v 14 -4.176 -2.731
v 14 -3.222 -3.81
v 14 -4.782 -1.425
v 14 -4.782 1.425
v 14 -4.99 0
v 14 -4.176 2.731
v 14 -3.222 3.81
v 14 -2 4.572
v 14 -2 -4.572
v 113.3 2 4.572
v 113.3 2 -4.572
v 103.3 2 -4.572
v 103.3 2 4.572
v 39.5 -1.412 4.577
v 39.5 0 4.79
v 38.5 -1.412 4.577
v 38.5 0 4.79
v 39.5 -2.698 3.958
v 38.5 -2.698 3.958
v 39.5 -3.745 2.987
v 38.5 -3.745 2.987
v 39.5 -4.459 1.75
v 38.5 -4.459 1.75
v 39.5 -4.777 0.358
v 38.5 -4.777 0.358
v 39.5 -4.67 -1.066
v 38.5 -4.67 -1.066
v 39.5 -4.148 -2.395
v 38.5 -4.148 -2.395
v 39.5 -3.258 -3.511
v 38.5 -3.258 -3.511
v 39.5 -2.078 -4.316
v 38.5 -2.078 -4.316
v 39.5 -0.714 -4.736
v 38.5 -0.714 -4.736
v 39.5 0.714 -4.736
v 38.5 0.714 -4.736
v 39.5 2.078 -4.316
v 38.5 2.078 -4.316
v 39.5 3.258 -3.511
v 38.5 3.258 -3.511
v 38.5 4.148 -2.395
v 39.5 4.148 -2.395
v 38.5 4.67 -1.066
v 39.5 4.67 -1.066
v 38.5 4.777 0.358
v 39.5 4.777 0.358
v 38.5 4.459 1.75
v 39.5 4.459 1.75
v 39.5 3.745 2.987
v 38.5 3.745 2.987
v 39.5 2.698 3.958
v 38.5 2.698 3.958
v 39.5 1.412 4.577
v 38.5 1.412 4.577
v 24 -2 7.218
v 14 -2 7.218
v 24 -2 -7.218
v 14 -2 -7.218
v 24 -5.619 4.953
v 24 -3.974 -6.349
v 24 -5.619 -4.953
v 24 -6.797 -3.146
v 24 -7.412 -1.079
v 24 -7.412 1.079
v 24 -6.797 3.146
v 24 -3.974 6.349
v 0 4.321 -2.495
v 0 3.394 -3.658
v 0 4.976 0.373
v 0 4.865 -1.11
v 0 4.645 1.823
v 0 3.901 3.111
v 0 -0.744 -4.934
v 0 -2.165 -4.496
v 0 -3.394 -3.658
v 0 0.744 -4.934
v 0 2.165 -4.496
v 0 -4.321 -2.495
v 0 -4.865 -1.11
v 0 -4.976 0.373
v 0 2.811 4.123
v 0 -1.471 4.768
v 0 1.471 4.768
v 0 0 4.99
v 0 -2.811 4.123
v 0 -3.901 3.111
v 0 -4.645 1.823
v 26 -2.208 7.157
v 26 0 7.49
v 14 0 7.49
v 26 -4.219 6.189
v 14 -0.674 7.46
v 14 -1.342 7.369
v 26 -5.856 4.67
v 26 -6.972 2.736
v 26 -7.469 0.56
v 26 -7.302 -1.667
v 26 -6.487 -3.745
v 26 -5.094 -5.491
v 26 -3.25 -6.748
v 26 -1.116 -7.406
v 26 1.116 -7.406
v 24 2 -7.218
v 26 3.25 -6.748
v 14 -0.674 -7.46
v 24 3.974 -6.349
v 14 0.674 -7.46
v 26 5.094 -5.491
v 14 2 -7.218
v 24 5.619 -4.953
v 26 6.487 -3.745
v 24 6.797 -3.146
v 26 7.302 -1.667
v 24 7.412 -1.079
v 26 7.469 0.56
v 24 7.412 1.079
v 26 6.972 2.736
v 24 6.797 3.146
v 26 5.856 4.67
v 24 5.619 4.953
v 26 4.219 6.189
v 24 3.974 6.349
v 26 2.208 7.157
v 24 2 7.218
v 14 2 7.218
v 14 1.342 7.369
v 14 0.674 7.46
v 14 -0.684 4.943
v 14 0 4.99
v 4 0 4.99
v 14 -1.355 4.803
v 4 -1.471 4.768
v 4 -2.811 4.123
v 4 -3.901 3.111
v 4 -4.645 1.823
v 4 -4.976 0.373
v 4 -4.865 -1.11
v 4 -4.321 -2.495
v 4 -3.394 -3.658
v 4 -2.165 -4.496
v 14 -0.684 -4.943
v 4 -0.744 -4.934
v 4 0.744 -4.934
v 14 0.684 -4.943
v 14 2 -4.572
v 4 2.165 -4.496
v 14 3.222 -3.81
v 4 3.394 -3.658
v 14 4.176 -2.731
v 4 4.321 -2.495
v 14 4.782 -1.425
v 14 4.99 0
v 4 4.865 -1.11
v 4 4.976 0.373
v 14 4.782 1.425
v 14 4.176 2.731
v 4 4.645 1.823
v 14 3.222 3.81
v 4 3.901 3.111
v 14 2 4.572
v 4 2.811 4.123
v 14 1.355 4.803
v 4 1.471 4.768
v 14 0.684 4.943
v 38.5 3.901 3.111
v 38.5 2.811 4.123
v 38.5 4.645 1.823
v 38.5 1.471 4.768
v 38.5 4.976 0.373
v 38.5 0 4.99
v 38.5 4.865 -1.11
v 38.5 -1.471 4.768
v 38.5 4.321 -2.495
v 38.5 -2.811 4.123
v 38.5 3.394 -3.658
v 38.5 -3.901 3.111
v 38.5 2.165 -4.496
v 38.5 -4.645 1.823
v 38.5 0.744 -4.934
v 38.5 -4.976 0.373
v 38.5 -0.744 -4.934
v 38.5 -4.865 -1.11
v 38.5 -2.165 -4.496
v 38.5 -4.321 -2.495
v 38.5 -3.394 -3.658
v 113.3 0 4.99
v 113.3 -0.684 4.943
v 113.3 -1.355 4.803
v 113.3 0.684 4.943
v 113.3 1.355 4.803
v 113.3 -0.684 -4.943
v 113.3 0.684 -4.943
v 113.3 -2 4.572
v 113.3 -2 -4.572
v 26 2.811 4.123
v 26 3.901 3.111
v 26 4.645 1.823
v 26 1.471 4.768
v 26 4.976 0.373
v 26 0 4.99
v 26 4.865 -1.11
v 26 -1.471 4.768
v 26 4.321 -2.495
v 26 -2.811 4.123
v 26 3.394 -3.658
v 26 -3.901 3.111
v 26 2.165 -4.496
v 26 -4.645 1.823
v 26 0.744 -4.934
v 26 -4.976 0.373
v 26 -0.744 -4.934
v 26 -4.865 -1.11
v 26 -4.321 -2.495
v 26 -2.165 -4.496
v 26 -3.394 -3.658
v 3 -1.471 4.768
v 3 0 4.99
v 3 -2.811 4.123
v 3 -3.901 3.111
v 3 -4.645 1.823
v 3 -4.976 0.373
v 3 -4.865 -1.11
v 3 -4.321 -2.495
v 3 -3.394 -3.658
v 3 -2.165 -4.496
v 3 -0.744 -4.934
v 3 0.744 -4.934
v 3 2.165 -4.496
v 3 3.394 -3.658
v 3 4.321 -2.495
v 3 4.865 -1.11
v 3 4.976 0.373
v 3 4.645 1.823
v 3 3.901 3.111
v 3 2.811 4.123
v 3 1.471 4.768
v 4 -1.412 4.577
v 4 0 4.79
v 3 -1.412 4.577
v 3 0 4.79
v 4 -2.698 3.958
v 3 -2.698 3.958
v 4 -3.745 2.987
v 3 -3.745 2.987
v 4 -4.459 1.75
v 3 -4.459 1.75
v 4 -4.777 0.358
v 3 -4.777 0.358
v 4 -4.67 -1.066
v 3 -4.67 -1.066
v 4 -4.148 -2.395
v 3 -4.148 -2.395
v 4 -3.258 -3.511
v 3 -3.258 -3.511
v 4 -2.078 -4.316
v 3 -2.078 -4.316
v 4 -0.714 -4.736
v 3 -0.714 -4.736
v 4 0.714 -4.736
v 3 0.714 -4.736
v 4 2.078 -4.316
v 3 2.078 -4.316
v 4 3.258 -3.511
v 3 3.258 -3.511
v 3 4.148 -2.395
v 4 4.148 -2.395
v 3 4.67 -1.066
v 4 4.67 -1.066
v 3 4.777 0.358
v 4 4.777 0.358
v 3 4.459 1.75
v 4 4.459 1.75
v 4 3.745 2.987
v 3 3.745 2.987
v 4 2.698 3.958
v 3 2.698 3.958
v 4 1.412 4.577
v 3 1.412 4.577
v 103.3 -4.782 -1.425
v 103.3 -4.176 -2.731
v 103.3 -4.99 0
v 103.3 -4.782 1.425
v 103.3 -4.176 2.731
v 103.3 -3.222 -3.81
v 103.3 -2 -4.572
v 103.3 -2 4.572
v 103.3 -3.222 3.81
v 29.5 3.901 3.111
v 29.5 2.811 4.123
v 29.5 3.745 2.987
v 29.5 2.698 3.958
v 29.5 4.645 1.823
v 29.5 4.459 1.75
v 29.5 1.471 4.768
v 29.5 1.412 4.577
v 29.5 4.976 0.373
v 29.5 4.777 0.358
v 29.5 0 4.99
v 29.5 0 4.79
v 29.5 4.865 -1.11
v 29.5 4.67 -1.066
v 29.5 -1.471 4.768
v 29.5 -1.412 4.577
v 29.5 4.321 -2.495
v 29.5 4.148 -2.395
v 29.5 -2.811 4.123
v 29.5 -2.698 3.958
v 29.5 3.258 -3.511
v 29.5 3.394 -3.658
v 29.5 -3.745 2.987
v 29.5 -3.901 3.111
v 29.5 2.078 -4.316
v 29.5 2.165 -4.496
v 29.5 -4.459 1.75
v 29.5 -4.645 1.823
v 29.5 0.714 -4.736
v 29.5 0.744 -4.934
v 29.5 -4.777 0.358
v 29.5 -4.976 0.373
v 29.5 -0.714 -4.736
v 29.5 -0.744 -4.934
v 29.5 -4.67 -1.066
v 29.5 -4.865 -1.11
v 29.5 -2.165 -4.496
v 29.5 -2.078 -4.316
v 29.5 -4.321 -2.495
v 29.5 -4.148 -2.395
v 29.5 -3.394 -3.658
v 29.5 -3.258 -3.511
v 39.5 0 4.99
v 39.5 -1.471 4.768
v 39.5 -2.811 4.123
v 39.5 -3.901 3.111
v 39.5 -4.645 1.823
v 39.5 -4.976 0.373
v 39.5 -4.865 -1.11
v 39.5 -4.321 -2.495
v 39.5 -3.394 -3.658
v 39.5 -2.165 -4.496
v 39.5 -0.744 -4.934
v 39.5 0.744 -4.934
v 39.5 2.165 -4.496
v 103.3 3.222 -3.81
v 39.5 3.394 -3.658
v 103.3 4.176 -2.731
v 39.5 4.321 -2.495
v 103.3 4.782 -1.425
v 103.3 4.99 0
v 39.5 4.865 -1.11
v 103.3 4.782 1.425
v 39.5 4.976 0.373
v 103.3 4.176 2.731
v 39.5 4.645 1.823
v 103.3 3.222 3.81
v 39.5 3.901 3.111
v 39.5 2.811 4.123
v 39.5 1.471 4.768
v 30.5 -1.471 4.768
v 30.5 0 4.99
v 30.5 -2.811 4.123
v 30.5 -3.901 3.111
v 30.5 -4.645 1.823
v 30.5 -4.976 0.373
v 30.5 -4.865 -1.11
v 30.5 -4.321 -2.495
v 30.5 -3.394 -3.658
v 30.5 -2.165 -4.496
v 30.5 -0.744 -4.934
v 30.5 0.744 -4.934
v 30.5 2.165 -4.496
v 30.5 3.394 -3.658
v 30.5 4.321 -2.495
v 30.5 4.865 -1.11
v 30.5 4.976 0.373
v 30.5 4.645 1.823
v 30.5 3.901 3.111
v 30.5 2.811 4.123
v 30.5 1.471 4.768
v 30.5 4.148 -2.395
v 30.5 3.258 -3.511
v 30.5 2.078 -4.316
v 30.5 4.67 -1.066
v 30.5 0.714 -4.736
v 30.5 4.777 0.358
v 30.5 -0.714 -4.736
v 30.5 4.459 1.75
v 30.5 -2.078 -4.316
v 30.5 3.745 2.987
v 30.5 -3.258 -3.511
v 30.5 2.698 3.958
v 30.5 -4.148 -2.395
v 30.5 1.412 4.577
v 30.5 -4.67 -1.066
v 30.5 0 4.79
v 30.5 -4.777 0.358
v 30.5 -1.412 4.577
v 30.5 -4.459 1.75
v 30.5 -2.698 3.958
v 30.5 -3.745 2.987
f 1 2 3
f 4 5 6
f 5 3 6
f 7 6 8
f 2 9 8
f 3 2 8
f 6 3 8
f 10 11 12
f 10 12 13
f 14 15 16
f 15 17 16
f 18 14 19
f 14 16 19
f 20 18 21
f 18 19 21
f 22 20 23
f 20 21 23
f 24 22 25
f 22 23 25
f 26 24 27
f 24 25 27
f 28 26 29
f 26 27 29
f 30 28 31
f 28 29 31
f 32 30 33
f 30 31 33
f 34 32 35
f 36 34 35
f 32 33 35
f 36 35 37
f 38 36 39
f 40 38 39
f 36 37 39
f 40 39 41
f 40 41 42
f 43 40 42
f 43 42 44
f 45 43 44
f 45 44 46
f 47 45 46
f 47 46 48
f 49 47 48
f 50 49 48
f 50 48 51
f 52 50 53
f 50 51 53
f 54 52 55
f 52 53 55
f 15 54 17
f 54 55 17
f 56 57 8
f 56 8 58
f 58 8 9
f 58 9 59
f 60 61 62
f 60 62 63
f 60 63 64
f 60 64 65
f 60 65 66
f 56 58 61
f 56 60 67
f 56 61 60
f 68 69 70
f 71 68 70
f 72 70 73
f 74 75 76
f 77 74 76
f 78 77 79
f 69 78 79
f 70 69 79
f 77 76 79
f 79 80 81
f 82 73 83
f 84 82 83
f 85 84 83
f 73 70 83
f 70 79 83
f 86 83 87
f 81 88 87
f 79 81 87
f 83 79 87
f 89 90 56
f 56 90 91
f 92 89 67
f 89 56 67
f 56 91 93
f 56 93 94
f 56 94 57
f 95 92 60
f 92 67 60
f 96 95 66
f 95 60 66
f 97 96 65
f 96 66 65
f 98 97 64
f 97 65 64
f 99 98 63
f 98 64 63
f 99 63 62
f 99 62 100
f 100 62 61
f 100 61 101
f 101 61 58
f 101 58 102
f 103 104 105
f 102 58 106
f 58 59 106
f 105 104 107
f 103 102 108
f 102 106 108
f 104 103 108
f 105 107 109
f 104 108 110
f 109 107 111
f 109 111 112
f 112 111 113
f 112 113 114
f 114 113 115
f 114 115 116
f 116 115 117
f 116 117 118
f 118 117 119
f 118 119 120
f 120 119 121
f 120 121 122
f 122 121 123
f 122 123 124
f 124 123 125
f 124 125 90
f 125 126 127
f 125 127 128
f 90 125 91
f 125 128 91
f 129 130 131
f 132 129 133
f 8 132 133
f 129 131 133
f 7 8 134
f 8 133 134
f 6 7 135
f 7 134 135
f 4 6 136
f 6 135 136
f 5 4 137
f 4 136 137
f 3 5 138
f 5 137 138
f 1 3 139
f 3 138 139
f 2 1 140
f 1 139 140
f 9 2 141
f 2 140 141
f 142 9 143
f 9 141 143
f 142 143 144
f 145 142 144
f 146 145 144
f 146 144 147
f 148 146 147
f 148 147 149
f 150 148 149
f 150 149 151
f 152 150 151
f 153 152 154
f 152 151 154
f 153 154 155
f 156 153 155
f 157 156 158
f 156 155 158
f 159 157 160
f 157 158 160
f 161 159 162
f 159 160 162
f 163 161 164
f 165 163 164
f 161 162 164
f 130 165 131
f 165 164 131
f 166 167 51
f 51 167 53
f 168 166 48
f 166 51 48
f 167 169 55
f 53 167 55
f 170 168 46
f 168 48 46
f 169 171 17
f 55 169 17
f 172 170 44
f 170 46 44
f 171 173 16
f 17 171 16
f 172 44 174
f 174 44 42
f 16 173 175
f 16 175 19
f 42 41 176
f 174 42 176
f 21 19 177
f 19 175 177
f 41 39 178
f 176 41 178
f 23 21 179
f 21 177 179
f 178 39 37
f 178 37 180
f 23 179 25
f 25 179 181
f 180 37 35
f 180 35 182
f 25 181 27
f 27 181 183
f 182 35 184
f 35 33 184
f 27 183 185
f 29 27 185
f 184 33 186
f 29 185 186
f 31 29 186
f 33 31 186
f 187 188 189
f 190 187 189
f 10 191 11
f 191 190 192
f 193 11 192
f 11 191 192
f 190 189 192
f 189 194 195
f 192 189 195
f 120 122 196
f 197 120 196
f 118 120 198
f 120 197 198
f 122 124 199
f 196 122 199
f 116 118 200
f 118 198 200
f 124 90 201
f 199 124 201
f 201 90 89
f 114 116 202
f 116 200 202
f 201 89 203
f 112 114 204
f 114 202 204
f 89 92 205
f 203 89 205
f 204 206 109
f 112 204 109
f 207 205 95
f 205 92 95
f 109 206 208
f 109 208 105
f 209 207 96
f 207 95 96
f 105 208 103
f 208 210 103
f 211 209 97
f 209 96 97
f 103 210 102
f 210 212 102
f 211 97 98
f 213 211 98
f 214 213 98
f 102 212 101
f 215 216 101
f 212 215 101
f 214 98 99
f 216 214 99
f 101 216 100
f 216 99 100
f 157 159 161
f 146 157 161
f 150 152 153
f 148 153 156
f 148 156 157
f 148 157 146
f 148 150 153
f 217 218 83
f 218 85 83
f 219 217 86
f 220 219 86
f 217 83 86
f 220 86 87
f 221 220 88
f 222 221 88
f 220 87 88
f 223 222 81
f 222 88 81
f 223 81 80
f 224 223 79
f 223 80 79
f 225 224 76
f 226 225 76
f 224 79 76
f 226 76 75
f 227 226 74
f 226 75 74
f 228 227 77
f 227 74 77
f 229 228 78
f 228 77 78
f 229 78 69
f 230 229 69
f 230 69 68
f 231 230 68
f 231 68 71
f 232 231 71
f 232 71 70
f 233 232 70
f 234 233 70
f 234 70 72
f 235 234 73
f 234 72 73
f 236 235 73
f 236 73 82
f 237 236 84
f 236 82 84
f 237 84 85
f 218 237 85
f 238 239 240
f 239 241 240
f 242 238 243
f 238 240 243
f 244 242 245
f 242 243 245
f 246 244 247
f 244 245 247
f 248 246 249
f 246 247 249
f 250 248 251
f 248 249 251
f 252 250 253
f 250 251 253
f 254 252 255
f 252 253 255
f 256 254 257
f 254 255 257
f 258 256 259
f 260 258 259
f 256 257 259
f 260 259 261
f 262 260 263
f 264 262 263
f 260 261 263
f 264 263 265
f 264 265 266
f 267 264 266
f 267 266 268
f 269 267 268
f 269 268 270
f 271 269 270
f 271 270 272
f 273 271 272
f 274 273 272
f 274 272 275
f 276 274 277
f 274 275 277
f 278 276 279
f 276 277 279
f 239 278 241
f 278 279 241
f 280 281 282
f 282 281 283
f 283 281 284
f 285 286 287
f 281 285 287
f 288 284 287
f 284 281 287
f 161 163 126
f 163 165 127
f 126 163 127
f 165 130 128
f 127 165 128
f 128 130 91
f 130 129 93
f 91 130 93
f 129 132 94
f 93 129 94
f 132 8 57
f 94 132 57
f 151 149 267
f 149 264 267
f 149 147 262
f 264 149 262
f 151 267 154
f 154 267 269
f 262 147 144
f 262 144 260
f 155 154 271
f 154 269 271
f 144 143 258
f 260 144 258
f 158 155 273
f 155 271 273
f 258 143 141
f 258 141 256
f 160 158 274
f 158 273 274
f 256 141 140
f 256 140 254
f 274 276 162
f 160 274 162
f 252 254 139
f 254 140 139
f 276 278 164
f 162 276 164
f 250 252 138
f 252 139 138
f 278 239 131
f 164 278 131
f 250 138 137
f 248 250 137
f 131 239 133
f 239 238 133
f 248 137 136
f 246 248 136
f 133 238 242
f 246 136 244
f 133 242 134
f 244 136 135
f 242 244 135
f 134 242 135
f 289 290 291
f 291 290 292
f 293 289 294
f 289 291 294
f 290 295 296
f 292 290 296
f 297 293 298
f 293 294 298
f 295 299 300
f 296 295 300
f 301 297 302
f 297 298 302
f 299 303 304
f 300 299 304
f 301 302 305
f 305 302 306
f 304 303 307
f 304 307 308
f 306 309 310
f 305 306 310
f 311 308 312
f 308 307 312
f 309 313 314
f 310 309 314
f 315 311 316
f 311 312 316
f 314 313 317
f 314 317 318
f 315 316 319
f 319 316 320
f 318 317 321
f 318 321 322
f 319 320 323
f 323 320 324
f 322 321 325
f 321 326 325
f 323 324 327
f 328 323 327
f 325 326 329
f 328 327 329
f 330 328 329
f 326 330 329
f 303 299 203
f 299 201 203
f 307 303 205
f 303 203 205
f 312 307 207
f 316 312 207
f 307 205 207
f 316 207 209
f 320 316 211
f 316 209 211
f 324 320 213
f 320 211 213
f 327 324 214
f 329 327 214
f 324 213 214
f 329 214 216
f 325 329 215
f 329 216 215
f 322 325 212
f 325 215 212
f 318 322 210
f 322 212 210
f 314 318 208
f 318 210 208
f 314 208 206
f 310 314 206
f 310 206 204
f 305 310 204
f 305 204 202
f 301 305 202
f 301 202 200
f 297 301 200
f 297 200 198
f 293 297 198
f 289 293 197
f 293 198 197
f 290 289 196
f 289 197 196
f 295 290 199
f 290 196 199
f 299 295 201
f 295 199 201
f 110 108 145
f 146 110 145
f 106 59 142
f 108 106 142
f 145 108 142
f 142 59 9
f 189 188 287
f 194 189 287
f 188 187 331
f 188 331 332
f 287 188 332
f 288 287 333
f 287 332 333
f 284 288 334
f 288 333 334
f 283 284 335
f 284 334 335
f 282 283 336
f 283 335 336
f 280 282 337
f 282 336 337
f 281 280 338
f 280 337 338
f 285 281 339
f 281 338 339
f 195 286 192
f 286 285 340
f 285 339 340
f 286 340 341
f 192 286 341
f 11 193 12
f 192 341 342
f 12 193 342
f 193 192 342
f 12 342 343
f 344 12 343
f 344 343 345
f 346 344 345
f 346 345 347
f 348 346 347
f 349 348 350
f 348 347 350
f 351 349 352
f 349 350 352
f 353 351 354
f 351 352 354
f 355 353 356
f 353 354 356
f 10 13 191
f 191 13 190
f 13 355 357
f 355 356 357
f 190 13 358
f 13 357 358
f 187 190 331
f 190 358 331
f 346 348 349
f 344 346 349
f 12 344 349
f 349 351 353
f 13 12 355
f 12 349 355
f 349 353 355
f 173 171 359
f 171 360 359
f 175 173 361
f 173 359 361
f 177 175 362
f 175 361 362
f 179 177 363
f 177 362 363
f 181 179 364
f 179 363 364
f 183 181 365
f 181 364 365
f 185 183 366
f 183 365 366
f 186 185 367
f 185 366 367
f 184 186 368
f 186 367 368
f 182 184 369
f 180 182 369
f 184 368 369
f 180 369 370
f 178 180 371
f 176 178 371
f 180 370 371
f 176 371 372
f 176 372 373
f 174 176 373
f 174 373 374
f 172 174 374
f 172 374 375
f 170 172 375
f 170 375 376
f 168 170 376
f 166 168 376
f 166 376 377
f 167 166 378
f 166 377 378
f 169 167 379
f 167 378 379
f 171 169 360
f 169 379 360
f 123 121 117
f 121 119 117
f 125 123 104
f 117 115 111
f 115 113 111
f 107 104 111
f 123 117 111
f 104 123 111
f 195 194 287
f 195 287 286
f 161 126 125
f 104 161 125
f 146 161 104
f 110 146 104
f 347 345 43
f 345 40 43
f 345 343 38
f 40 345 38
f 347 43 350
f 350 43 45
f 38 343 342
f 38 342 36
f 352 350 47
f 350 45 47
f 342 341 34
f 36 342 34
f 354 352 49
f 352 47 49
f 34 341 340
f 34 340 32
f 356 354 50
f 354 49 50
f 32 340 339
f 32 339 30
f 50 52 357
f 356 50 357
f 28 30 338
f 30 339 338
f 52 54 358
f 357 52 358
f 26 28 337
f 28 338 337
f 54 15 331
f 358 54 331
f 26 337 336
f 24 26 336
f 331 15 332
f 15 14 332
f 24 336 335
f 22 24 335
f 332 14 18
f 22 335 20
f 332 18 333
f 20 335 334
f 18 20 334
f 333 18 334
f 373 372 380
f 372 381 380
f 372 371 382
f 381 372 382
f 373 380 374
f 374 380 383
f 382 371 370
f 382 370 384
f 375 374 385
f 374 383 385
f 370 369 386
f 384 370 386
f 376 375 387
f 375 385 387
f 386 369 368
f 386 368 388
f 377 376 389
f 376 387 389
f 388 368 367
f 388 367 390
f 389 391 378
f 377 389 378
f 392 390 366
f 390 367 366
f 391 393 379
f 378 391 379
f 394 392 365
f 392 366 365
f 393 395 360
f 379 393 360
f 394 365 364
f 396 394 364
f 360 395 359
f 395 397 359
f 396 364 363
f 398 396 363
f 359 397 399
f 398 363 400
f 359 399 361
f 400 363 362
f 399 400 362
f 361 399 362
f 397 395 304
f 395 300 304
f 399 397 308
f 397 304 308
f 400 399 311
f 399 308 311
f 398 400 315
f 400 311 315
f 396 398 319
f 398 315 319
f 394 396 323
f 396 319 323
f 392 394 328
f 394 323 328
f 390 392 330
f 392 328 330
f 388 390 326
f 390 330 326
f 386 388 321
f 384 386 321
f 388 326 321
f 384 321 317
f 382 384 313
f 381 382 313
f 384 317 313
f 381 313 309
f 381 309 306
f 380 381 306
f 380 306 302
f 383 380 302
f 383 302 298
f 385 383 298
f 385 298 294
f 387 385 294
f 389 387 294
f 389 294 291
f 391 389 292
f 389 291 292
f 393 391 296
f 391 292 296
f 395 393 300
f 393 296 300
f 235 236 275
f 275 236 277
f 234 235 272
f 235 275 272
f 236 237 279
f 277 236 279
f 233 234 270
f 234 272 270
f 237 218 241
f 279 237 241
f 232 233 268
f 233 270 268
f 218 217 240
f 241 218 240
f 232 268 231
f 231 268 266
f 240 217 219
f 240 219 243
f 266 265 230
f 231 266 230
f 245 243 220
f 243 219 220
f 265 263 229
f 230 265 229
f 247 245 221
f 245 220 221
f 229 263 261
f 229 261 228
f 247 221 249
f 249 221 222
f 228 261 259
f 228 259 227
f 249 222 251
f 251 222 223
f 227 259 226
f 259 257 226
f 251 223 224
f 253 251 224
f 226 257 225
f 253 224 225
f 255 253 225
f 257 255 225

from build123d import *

# Parameters (mm, degrees)
CUT_EXTRUDE8_DEPTH = 10
CUT_EXTRUDE9_DEPTH = 10


with BuildPart() as part:
    # Sketch3 → Revolve1 (revolve)
    with BuildSketch(Plane(origin=(0, 0, 0), x_dir=(1, 0, 0), z_dir=(0, 1, 0)), mode=Mode.PRIVATE) as revolve1_sk:
        Polygon((0, 0), (113.3, 0), (113.3, 4.99), (39.5, 4.99), (39.5, 4.79), (38.5, 4.79), (38.5, 4.99), (30.5, 4.99), (30.5, 4.79), (29.5, 4.79), (29.5, 4.99), (26, 4.99), (26, 7.49), (14, 7.49), (14, 4.99), (4, 4.99), (4, 4.79), (3, 4.79), (3, 4.99), (0, 4.99), align=None)
    revolve(revolve1_sk.sketch.rotate(Axis((0, 0, 0), (1, 0, 0)), 180), axis=Axis((0, 0, 0), (1, 0, 0)))

    # Sketch10 → Cut-Extrude8 (cut)
    with BuildSketch(Plane.ZY.offset(-14)):
        with BuildLine():
            Line((7.228416147, 2), (-7.228416147, 2))
            ThreePointArc((-7.228416147, 2), (0, 7.5), (7.228416147, 2))
        make_face()
        with BuildLine():
            Line((7.228416147, -2), (-7.228416147, -2))
            ThreePointArc((-7.228416147, -2), (0, -7.5), (7.228416147, -2))
        make_face()
    extrude(amount=-CUT_EXTRUDE8_DEPTH, mode=Mode.SUBTRACT)

    # Sketch11 → Cut-Extrude9 (cut)
    with BuildSketch(Plane(origin=(113.3, 0, 0), x_dir=(0, 0, -1), z_dir=(1, 0, 0))):
        with BuildLine():
            Line((-4.582575695, -2), (4.582575695, -2))
            ThreePointArc((4.582575695, -2), (0, -5), (-4.582575695, -2))
        make_face()
        with BuildLine():
            Line((4.582575695, 2), (-4.582575695, 2))
            ThreePointArc((-4.582575695, 2), (0, 5), (4.582575695, 2))
        make_face()
    extrude(amount=-CUT_EXTRUDE9_DEPTH, mode=Mode.SUBTRACT)


solid = part.part
